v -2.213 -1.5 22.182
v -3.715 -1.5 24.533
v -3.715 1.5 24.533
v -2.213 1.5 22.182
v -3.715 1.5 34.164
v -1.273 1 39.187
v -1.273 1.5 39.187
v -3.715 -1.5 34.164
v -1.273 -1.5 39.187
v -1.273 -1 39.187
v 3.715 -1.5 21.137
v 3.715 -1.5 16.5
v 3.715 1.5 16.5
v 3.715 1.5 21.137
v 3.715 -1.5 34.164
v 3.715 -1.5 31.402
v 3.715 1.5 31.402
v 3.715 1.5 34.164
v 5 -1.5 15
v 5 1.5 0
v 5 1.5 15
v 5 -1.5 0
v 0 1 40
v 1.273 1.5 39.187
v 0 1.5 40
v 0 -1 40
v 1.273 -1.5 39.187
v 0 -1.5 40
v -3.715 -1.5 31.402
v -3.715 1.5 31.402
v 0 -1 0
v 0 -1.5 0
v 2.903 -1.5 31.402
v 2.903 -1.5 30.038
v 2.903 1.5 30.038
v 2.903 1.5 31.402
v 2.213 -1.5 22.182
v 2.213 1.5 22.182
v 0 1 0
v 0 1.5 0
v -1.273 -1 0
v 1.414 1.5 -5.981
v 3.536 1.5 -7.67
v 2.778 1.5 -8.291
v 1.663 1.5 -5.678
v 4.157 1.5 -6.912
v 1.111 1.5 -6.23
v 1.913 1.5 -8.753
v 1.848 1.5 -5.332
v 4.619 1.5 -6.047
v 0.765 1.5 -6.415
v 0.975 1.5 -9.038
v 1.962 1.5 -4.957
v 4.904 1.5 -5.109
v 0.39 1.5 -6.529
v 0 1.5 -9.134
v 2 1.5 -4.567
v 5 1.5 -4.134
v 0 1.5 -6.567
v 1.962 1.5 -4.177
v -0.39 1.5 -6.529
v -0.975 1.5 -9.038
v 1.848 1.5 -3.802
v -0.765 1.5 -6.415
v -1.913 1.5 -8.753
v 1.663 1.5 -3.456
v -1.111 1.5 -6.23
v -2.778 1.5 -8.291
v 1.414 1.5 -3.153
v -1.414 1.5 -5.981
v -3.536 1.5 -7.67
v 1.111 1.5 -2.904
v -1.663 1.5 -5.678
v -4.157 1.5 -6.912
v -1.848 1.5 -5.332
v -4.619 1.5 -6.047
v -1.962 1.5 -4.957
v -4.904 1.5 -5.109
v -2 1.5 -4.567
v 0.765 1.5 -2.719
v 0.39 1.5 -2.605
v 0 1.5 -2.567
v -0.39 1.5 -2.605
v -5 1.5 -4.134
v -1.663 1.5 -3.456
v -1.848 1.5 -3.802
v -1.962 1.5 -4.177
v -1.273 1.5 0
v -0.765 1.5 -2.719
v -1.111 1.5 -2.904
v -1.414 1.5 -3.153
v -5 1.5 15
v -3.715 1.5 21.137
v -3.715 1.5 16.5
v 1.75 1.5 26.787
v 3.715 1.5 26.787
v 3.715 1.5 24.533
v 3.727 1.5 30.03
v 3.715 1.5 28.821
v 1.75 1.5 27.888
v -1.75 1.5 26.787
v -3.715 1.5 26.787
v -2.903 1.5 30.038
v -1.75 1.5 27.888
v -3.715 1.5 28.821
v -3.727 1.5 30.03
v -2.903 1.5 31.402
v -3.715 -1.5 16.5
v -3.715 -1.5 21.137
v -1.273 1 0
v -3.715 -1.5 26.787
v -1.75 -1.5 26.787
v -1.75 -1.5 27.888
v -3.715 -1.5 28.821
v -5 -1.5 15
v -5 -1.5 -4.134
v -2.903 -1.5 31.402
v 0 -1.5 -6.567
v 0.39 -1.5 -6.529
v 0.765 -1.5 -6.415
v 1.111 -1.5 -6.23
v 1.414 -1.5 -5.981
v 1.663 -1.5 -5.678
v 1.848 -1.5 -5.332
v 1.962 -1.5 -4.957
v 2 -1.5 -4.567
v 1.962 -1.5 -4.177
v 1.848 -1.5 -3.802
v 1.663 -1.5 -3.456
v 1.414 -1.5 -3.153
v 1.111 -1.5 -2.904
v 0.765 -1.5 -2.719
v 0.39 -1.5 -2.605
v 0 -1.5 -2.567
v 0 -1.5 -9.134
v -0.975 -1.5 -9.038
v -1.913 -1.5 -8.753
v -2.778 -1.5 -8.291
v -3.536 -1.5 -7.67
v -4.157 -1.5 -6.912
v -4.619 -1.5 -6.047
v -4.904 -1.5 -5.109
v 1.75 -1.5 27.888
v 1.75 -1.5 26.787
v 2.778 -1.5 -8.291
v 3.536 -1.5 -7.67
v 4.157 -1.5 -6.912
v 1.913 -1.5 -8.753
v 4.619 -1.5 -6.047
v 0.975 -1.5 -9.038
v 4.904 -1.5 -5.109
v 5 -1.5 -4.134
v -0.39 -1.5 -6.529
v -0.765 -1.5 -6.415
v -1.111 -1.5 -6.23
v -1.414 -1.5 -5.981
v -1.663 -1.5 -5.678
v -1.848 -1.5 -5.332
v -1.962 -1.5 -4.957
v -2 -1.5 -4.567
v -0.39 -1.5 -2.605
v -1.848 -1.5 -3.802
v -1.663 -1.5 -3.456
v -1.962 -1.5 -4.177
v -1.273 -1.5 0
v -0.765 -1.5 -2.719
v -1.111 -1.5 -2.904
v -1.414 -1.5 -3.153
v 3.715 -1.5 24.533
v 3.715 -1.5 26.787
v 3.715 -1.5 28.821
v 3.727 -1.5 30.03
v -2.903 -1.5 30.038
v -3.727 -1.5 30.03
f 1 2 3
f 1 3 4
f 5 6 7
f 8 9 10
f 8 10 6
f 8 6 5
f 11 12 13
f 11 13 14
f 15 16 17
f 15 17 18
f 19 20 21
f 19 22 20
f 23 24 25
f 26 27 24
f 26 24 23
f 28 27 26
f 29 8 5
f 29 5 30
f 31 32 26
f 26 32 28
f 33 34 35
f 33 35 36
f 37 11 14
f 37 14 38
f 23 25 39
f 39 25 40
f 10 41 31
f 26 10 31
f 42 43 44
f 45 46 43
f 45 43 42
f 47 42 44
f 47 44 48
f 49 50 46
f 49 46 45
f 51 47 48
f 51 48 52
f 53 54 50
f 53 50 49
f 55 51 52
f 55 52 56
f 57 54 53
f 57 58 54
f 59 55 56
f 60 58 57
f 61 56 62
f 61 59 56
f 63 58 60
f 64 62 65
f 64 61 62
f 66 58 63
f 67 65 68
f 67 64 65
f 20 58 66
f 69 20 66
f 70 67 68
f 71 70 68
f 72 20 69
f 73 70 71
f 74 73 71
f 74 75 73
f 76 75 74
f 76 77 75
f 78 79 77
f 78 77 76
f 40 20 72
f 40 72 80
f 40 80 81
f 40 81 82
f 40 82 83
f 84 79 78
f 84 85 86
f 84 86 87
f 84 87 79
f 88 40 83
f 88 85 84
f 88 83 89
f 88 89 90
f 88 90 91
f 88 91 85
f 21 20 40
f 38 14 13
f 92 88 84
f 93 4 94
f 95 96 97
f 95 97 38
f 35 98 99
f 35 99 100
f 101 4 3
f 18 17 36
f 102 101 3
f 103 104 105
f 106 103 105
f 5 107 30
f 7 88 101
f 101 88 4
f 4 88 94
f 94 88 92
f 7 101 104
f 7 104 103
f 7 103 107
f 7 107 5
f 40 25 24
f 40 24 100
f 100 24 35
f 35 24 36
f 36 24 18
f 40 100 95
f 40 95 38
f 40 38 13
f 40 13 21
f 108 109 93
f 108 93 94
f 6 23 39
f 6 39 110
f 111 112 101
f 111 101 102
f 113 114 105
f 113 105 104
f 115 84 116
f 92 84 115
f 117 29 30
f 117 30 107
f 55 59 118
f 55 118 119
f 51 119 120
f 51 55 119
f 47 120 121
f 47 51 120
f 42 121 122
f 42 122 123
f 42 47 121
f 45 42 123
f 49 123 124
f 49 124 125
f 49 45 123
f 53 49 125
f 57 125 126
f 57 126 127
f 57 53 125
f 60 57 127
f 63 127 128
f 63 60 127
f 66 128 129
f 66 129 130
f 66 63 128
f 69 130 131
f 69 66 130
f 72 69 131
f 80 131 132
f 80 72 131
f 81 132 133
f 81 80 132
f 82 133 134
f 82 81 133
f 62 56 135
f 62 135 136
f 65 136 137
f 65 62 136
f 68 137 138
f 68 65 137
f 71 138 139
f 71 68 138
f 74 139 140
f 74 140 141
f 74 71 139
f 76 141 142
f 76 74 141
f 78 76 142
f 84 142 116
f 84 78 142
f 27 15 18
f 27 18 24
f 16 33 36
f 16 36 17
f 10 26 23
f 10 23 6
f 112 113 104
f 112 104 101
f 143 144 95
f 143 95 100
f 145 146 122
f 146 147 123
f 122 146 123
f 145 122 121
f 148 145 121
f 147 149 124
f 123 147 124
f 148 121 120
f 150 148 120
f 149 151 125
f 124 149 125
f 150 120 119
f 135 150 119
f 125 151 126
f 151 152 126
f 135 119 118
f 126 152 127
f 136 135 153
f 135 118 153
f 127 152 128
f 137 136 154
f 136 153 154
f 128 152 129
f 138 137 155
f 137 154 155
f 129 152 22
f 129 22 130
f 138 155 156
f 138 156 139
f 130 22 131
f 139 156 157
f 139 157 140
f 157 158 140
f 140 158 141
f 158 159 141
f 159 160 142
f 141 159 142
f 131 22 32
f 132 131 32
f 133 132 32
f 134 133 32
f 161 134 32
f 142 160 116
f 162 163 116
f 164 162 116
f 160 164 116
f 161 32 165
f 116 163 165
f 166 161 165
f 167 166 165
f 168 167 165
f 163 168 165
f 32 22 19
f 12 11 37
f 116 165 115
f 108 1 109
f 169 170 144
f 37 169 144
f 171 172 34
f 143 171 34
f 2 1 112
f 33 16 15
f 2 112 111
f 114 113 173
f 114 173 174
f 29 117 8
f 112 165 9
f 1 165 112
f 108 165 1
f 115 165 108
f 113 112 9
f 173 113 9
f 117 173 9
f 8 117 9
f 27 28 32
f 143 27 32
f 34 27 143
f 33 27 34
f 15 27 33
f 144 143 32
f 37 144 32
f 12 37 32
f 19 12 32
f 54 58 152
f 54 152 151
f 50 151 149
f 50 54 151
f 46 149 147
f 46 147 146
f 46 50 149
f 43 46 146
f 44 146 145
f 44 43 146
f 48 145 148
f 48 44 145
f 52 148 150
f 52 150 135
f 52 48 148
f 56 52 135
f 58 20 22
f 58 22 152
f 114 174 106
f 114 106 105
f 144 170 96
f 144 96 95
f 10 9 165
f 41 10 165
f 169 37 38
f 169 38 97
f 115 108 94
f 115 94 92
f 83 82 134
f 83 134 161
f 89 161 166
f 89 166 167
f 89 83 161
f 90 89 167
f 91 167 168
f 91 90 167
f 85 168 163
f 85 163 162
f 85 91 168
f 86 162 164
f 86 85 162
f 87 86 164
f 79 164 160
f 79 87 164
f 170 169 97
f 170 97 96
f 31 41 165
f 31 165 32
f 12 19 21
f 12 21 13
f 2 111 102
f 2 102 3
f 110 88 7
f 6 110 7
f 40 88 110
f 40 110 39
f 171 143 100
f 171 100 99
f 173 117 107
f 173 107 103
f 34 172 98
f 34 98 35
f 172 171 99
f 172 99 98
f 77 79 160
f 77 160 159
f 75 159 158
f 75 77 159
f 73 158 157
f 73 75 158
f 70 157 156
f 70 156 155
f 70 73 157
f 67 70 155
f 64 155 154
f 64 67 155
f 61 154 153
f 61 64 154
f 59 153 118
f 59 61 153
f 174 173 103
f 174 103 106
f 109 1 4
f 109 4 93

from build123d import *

# Parameters (mm, degrees)
F1_DEPTH = 1.5
F3_DEPTH = 0.5
F5_DEPTH = 0.5
F7_DEPTH = 3


# Not quite as in the source:
# - ends of sketch curves that miss each other by under 0.0002 mm in the source are joined
# - a feature names something its author has since deleted; it is built from what else it names


with BuildPart() as f1:
    # F0 (on Front) → F1 (new body, symmetric)
    with BuildSketch(Plane.XZ):
        Polygon((0, 40), (0, 0), (5, 0), (5, 15), (3.7145695426, 16.5003631264), (3.7145695426, 21.137110889), (2.2125243451, 22.1820119768), (3.7145695426, 24.5330389589), (3.7145695426, 26.7870686948), (1.7496975381, 26.7870686948), (1.7496975381, 27.8878770769), (3.7145695426, 28.8214460015), (3.7266683541, 30.0295948982), (2.903013601, 30.0378432554), (2.903013601, 31.4024910331), (3.7145695426, 31.4024910331), (3.7145695426, 34.1644659638), (1.2732772157, 39.1865172364), align=None)
        Polygon((-1.2732772157, 0), (0, 0), (0, 40), (-1.2732772157, 39.1865172364), align=None)
        Polygon((-5, 0), (-1.2732772157, 0), (-1.2732772157, 39.1865172364), (-3.7145695426, 34.1644659638), (-3.7145695426, 31.4024910331), (-2.903013601, 31.4024910331), (-2.903013601, 30.0378432554), (-3.7266683541, 30.0295948982), (-3.7145695426, 28.8214460015), (-1.7496975381, 27.8878770769), (-1.7496975381, 26.7870686948), (-3.7145695426, 26.7870686948), (-3.7145695426, 24.5330389589), (-2.2125243451, 22.1820119768), (-3.7145695426, 21.137110889), (-3.7145695426, 16.5003631264), (-5, 15), align=None)
    extrude(amount=F1_DEPTH, both=True)

    # F2 (on face) → F3 (cut)
    with BuildSketch(Plane.XZ.offset(1.5)):
        Polygon((0, 0), (0, 40), (-1.2732772157, 39.1865172364), (-1.2732772157, 0), align=None)
    extrude(amount=-F3_DEPTH, mode=Mode.SUBTRACT)

    # F4 (on face) → F5 (cut)
    with BuildSketch(Plane(origin=(0, 1.5, 0), x_dir=(-1, 0, 0), z_dir=(0, 1, 0))):
        Polygon((1.2732772157, 0), (1.2732772157, 39.1865172364), (0, 40), (0, 0), align=None)
    extrude(amount=-F5_DEPTH, mode=Mode.SUBTRACT)

    # F6 (on face) → F7 (join)
    with BuildSketch(Plane(origin=(0, 1.5, 0), x_dir=(-1, 0, 0), z_dir=(0, 1, 0))):
        with BuildLine():
            Line((-5, 0), (-4.9999982459, -4.1340150831))
            ThreePointArc((-4.9999982459, -4.1340150831), (-3.5355314017, -7.6695476176), (1.7541e-06, -9.1340129616))
            Line((1.7541e-06, -9.1340129616), (1.3932e-06, -6.5670064808))
            ThreePointArc((1.3932e-06, -6.5670064808), (-1.9999990311, -4.5670062085), (5.446e-07, -2.5670064808))
            Line((5.446e-07, -2.5670064808), (0, 0))
            Line((0, 0), (-5, 0))
        make_face()
        with BuildLine():
            Line((1.3932e-06, -6.5670064808), (1.9378e-06, -9.1340129616))
            ThreePointArc((1.9378e-06, -9.1340129616), (3.5355339059, -7.6695468675), (5, -4.1340129616))
            Line((5, -4.1340129616), (5, 0))
            Line((5, 0), (0, 0))
            Line((0, 0), (5.446e-07, -2.5670064808))
            ThreePointArc((5.446e-07, -2.5670064808), (1.4142143813, -3.1527927684), (2.0000009689, -4.5670064808))
            ThreePointArc((2.0000009689, -4.5670064808), (1.4142141887, -5.9812203857), (1.3932e-06, -6.5670064808))
        make_face()
    extrude(amount=-F7_DEPTH)


solid = f1.part
